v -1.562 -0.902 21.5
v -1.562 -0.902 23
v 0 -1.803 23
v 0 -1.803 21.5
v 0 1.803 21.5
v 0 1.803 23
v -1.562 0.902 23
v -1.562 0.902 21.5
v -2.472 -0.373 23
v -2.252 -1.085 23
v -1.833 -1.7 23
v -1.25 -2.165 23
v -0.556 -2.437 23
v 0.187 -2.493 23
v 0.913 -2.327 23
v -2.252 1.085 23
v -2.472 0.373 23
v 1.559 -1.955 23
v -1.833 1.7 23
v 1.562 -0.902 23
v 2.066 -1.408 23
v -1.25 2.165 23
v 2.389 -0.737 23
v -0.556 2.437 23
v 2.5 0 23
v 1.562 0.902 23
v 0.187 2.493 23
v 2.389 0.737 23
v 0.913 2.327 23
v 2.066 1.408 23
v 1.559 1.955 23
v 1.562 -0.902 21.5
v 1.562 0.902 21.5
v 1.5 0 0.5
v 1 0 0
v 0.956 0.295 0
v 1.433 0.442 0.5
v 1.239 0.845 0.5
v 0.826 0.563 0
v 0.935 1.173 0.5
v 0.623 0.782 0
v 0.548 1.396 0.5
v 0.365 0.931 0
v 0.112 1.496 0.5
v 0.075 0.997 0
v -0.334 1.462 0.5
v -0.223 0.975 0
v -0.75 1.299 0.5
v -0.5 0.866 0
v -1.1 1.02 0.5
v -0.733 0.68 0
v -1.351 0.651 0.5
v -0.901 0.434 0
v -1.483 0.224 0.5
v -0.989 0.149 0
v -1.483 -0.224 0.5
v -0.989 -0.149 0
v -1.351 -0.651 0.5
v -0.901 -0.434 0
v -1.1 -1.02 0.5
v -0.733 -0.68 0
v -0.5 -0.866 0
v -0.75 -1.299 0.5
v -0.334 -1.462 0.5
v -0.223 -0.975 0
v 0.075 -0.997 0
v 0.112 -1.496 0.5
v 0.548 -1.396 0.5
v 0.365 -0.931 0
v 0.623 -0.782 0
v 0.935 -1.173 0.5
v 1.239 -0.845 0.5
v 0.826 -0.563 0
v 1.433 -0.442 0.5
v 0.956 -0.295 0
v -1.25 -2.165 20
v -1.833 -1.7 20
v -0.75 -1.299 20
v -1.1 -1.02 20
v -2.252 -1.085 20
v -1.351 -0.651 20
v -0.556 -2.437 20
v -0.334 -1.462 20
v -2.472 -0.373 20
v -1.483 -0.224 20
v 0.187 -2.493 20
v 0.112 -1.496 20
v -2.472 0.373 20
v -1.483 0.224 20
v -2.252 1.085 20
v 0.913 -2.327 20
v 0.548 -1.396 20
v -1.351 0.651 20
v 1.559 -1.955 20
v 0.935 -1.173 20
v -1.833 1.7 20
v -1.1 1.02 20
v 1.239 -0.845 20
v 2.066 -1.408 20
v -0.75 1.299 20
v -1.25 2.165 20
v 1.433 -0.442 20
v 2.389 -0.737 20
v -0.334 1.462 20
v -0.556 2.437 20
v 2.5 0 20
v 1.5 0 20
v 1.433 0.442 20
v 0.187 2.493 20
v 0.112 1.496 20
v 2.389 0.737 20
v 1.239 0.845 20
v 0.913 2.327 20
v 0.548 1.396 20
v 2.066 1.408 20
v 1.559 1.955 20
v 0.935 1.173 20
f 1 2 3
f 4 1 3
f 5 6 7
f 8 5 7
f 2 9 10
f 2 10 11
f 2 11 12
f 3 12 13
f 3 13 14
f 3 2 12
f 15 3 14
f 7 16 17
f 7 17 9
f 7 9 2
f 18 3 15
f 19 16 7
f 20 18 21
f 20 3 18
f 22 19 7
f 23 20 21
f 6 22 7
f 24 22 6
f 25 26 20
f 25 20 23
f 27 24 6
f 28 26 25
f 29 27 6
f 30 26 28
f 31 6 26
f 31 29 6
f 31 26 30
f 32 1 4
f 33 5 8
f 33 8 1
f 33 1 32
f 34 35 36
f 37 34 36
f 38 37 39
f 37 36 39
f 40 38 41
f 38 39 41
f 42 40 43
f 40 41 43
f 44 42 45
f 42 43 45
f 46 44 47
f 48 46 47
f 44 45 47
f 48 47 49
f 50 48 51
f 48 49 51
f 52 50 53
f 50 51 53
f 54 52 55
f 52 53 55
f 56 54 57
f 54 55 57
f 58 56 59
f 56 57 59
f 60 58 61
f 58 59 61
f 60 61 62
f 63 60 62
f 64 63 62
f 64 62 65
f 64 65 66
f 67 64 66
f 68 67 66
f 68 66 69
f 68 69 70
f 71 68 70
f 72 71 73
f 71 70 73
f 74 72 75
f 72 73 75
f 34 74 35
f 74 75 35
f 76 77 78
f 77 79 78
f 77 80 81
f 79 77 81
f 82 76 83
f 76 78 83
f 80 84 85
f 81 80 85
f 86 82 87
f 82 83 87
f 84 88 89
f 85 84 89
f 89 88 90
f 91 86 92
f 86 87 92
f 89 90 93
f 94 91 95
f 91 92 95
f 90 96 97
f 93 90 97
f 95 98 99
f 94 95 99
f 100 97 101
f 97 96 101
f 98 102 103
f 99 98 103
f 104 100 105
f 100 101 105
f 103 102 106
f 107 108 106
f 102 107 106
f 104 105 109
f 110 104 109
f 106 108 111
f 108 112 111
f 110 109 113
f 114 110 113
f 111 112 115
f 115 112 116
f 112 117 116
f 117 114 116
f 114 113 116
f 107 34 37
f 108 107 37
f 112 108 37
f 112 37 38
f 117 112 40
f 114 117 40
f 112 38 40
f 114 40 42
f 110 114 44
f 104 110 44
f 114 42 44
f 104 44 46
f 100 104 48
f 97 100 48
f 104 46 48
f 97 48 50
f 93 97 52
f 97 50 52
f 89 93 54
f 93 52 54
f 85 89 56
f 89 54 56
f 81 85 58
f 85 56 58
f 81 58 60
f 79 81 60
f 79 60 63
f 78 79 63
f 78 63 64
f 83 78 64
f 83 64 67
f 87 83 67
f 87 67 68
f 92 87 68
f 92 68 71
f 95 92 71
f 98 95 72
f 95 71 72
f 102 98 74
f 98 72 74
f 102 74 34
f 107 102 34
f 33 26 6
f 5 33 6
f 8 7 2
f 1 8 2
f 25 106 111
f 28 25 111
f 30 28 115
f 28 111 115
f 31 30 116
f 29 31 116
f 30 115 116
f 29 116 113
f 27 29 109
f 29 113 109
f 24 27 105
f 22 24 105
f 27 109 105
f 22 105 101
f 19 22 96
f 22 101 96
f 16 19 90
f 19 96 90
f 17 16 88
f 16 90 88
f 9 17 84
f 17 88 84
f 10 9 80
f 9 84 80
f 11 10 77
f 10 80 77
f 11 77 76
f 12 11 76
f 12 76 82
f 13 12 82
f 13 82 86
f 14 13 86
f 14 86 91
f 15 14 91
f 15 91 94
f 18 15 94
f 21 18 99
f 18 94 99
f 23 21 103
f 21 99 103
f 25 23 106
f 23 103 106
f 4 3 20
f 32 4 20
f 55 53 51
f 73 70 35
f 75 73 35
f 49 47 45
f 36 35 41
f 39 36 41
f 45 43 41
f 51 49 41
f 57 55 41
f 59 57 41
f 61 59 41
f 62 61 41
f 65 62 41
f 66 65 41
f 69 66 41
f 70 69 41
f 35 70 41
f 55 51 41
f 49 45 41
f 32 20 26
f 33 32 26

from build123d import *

# Parameters (mm, degrees)
SKETCH_1_R          = 1.5
EXTRUDE_1_DEPTH     = 20
SKETCH_2_R          = 2.5
EXTRUDE_2_DEPTH     = 3
CUT_EXTRUDE_1_DEPTH = 1.5
CHAMFER_1_SIZE      = 0.5


with BuildPart() as part:
    # 草图1 → 凸台-拉伸1 (new body)
    with BuildSketch(Plane.XY):
        Circle(SKETCH_1_R)
    extrude(amount=EXTRUDE_1_DEPTH)

    # 草图2 → 凸台-拉伸2 (add)
    with BuildSketch(Plane.XY.offset(20)):
        Circle(SKETCH_2_R)
    extrude(amount=EXTRUDE_2_DEPTH)

    # 草图3 → 切除-拉伸1 (cut)
    with BuildSketch(Plane.XY.offset(23)):
        Polygon((0, 1.803382283), (-1.56177487, 0.901691141), (-1.56177487, -0.901691141), (0, -1.803382283), (1.56177487, -0.901691141), (1.56177487, 0.901691141), align=None)
    extrude(amount=-CUT_EXTRUDE_1_DEPTH, mode=Mode.SUBTRACT)

    # 倒角1
    chamfer_1_edges = [part.edges().sort_by_distance(p)[0] for p in [
        (-1.5, 0, 0),
    ]]
    chamfer(chamfer_1_edges, length=CHAMFER_1_SIZE)


solid = part.part
